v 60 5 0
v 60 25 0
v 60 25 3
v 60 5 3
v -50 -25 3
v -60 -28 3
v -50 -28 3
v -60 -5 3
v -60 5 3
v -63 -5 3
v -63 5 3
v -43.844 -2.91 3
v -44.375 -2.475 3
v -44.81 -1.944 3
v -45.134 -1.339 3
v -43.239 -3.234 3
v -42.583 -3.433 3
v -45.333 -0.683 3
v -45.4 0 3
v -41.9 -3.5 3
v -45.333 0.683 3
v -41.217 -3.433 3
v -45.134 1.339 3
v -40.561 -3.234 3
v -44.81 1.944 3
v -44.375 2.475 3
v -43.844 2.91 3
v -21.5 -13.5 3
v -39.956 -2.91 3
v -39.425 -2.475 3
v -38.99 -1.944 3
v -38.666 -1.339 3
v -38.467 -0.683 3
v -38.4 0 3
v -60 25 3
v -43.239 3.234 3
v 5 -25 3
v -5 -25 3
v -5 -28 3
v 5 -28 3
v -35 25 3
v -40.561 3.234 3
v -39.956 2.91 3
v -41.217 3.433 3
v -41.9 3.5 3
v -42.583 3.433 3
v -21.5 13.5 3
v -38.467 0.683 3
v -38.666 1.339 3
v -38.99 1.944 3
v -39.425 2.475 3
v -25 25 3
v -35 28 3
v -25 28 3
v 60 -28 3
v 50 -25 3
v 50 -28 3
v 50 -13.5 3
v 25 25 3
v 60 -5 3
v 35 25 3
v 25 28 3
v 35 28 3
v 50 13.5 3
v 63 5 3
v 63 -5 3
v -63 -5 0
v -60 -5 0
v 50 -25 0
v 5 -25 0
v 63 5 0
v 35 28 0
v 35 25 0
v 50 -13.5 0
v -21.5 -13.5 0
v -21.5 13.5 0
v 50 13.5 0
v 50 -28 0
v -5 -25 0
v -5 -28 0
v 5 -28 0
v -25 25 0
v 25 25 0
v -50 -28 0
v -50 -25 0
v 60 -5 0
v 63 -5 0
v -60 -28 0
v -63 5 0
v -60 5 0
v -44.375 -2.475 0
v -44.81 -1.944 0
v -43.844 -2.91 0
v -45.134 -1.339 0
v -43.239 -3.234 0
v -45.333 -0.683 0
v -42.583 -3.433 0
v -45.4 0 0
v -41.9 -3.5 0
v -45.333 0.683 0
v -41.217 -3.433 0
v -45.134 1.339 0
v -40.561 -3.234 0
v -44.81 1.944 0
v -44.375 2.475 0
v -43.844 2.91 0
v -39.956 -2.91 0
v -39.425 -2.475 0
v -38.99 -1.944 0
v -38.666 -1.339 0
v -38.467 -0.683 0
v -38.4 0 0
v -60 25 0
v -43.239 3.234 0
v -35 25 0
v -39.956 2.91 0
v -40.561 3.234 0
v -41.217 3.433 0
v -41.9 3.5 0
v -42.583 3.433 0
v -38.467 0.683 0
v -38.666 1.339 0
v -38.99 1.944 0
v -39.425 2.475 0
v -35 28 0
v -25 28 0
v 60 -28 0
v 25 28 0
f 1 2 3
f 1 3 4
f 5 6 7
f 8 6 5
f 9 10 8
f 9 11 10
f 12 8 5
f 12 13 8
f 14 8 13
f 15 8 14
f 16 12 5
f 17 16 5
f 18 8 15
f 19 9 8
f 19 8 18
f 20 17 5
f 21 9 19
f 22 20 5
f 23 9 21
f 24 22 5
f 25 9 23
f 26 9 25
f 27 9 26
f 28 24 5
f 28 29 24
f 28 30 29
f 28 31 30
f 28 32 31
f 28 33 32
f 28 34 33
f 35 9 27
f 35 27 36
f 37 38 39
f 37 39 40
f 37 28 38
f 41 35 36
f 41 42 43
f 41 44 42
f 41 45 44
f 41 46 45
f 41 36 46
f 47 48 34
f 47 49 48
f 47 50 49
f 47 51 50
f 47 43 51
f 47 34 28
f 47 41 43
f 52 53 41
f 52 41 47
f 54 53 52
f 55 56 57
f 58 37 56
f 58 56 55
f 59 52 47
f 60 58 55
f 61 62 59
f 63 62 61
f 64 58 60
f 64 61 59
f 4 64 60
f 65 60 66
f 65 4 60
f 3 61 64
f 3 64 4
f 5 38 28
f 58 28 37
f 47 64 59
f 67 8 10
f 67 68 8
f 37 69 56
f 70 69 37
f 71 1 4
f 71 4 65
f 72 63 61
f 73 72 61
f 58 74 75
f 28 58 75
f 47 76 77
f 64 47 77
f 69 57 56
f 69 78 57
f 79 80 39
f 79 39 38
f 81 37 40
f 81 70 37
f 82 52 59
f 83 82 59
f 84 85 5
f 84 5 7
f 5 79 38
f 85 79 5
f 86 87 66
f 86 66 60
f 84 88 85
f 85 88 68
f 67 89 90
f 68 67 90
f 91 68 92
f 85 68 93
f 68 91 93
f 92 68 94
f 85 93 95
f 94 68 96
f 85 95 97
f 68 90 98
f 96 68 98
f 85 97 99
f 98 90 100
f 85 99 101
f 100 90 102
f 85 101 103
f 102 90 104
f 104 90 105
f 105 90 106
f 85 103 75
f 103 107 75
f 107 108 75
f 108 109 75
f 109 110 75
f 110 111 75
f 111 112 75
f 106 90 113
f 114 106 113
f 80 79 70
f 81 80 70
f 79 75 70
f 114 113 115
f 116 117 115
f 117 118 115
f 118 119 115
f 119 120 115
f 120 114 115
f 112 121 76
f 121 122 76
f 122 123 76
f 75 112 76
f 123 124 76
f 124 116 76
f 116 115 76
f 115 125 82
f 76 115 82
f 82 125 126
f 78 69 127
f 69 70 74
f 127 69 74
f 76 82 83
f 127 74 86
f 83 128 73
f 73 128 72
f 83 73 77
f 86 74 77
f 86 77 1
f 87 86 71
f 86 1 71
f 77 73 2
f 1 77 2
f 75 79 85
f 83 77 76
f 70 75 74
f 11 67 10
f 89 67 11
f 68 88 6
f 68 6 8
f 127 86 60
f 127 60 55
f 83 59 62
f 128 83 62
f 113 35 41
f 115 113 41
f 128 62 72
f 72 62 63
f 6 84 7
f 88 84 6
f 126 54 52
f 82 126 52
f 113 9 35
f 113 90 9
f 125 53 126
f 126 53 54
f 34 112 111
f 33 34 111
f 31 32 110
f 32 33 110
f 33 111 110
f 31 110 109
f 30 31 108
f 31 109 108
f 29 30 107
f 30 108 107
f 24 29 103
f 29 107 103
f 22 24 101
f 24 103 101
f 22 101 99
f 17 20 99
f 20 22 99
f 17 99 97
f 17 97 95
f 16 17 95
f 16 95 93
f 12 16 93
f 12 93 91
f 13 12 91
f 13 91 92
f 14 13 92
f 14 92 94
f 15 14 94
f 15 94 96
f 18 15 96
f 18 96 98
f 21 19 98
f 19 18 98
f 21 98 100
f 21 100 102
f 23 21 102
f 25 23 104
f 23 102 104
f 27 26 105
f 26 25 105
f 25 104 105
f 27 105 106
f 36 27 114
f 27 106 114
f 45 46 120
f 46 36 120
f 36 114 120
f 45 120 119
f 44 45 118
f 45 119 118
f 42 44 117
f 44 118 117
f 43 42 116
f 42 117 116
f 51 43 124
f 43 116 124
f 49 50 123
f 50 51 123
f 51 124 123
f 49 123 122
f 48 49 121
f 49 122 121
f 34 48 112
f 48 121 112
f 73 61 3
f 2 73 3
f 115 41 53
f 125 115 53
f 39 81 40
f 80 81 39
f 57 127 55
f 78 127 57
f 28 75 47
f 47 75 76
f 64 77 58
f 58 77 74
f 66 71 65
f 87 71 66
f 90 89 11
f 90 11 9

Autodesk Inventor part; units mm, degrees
ref_plane "YZ Plane" through (0, 0, 0) normal (1, 0, 0) x (0, 1, 0)
ref_plane "XZ Plane" through (0, 0, 0) normal (0, 1, 0) x (-1, 0, 0)
ref_plane "XY Plane" through (0, 0, 0) normal (0, 0, 1) x (1, 0, 0)
sketch "Sketch1" plane through (0, 0, 0) normal (0, 0, 1) x (1, 0, 0)
  line L0 (60, -25) -> (-60, -25)
  line L1 (-60, -25) -> (-60, 25)
  line L2 (-60, 25) -> (60, 25)
  line L3 (60, 25) -> (60, -25)
  line L4 (60, -25) -> (-60, 25) construction
  line L5 (-60, -25) -> (60, 25) construction
  line L6 (50, -13.5) -> (-21.5, -13.5)
  line L7 (-21.5, -13.5) -> (-21.5, 13.5)
  line L8 (-21.5, 13.5) -> (50, 13.5)
  line L9 (50, 13.5) -> (50, -13.5)
  line L10 (50, -13.5) -> (-21.5, 13.5) construction
  line L11 (-21.5, -13.5) -> (50, 13.5) construction
  line L12 (-33.5, -13.1) -> (-52.2, -13.1)
  line L13 (-52.2, -13.1) -> (-52.2, 13.1)
  line L14 (-52.2, 13.1) -> (-33.5, 13.1)
  line L15 (-33.5, 13.1) -> (-33.5, -13.1)
  line L16 (-33.5, -13.1) -> (-52.2, 13.1) construction
  line L17 (-52.2, -13.1) -> (-33.5, 13.1) construction
  circle A0 centre (-41.9, 0) radius 3.5
  line L18 (-5, 28) -> (5, 28)
  line L19 (5, 28) -> (5, 25)
  line L20 (5, 25) -> (-5, 25)
  line L21 (-5, 25) -> (-5, 28)
  line L22 (-5, -25) -> (5, -25)
  line L23 (5, -25) -> (5, -28)
  line L24 (5, -28) -> (-5, -28)
  line L25 (-5, -28) -> (-5, -25)
  line L26 (-60, 28) -> (-50, 28)
  line L27 (-50, 28) -> (-50, 25)
  line L28 (-50, 25) -> (-60, 25)
  line L29 (-60, 25) -> (-60, 28)
  line L30 (50, 28) -> (60, 28)
  line L31 (60, 28) -> (60, 25)
  line L32 (60, 25) -> (50, 25)
  line L33 (50, 25) -> (50, 28)
  line L34 (-60, -25) -> (-50, -25)
  line L35 (-50, -25) -> (-50, -28)
  line L36 (-50, -28) -> (-60, -28)
  line L37 (-60, -28) -> (-60, -25)
  line L38 (50, -25) -> (60, -25)
  line L39 (60, -25) -> (60, -28)
  line L40 (60, -28) -> (50, -28)
  line L41 (50, -28) -> (50, -25)
  line L42 (-63, 5) -> (-60, 5)
  line L43 (-60, 5) -> (-60, -5)
  line L44 (-60, -5) -> (-63, -5)
  line L45 (-63, -5) -> (-63, 5)
  line L46 (63, -5) -> (60, -5)
  line L47 (60, -5) -> (60, 5)
  line L48 (60, 5) -> (63, 5)
  line L49 (63, 5) -> (63, -5)
  point P0 (0, 0)
  point P1 (14.25, 0)
  point P2 (-42.85, 0)
  point P3 (0, 25)
  point P4 (0, -25)
  point P5 (-60, 0)
  point P6 (60, 0)
  dimension "d0" = 120
  dimension "d1" = 50
  dimension "d2" = 27
  dimension "d3" = 71.5
  dimension "d4" = 10
  dimension "d6" = 18.7
  dimension "d7" = 26.2
  dimension "d8" = 7
  dimension "d9" = 8.4
  dimension "d10" = 12
  dimension "d11" = 10
  dimension "d12" = 3
  dimension "d13" = 10
  dimension "d14" = 3
  dimension "d15" = 10
  dimension "d16" = 3
  dimension "d17" = 10
  dimension "d18" = 3
  dimension "d19" = 10
  dimension "d20" = 3
  dimension "d21" = 10
  dimension "d22" = 3
  dimension "d23" = 3
  dimension "d24" = 10
  dimension "d25" = 3
  dimension "d26" = 10
extrude "Extrusion1" add sketch "Sketch1" along normal blind 3 contours L39 L40 L41 L0 | L0 L1 L2 L3 | L3 L48 L49 L46 | L23 L24 L25 L0 | L2 L33 L30 L31 | L35 L36 L37 L0 | L2 L21 L18 L19 | L44 L45 L42 L1 | L2 L29 L26 L27 | L12 L13 L14 L15
sketch "Sketch2" plane through (0, 0, 3) normal (0, 0, 1) x (1, 0, 0)
  line L0 (-60, 28) -> (-60, 5) projected
  line L1 (-50, 28) -> (-60, 28) projected
  line L2 (-50, 25) -> (-50, 28) projected
  line L3 (-5, 25) -> (-50, 25) projected
  line L4 (60, 5) -> (60, 28) projected
  line L5 (60, 28) -> (50, 28) projected
  line L6 (50, 28) -> (50, 25) projected
  line L7 (50, 25) -> (5, 25) projected
  line L8 (5, 25) -> (5, 28) projected
  line L9 (5, 28) -> (-5, 28) projected
  line L10 (-5, 28) -> (-5, 25) projected
  line L11 (-60, 25) -> (60, 25)
  point P0 (0, 0)
extrude "Extrusion2" cut sketch "Sketch2" against normal through all
sketch "Sketch3" plane through (0, 0, 3) normal (0, 0, 1) x (1, 0, 0)
  line L0 (60, 25) -> (-60, 25) projected
  line L1 (-35, 28) -> (-25, 28)
  line L2 (-25, 28) -> (-25, 25)
  line L3 (-25, 25) -> (-35, 25)
  line L4 (-35, 25) -> (-35, 28)
  line L5 (25, 28) -> (35, 28)
  line L6 (35, 28) -> (35, 25)
  line L7 (35, 25) -> (25, 25)
  line L8 (25, 25) -> (25, 28)
  point P0 (0, 0)
  point P1 (-30, 25)
  point P2 (0, 25)
  point P3 (-30, 28)
  point P4 (30, 25)
  dimension "d31" = 120
  dimension "d32" = 10
  dimension "d33" = 3
  dimension "d34" = 10
  dimension "d35" = 3
  dimension "d36" = 30
  dimension "d37" = 30
extrude "Extrusion3" add sketch "Sketch3" against normal blind 3
sketch "Sketch4" plane through (0, 0, 3) normal (0, 0, 1) x (1, 0, 0)
  circle A0 centre (-41.9, 0) radius 3.5 projected
  line L0 (50, -13.5) -> (50, 13.5) projected
  line L1 (50, 13.5) -> (-21.5, 13.5) projected
  line L2 (-21.5, 13.5) -> (-21.5, -13.5) projected
  line L3 (-21.5, -13.5) -> (50, -13.5) projected
  line L4 (60, 5) -> (63, 5) projected
  line L5 (63, 5) -> (63, -5) projected
  line L6 (63, -5) -> (60, -5) projected
  line L7 (60, -5) -> (60, -28) projected
  line L8 (60, -28) -> (50, -28) projected
  line L9 (50, -28) -> (50, -25) projected
  line L10 (50, -25) -> (5, -25) projected
  line L11 (5, -25) -> (5, -28) projected
  line L12 (5, -28) -> (-5, -28) projected
  line L13 (-5, -28) -> (-5, -25) projected
  line L14 (-5, -25) -> (-50, -25) projected
  line L15 (-50, -25) -> (-50, -28) projected
  line L16 (-50, -28) -> (-60, -28) projected
  line L17 (-60, -28) -> (-60, -5) projected
  line L18 (-60, -5) -> (-63, -5) projected
  line L19 (-63, -5) -> (-63, 5) projected
  line L20 (-63, 5) -> (-60, 5) projected
  line L21 (-60, 5) -> (-60, 25) projected
  line L22 (-60, 25) -> (-35, 25) projected
  line L23 (-35, 25) -> (-35, 28) projected
  line L24 (-35, 28) -> (-25, 28) projected
  line L25 (-25, 28) -> (-25, 25) projected
  line L26 (-25, 25) -> (25, 25) projected
  line L27 (25, 25) -> (25, 28) projected
  line L28 (25, 28) -> (35, 28) projected
  line L29 (35, 28) -> (35, 25) projected
  line L30 (35, 25) -> (60, 25) projected
  line L31 (60, 25) -> (60, 5) projected
  point P0 (0, 0)
equation "\"d36\" = 0.25 * d31"
equation "\"d37\" = d36"
properties part number "Front-panel"
